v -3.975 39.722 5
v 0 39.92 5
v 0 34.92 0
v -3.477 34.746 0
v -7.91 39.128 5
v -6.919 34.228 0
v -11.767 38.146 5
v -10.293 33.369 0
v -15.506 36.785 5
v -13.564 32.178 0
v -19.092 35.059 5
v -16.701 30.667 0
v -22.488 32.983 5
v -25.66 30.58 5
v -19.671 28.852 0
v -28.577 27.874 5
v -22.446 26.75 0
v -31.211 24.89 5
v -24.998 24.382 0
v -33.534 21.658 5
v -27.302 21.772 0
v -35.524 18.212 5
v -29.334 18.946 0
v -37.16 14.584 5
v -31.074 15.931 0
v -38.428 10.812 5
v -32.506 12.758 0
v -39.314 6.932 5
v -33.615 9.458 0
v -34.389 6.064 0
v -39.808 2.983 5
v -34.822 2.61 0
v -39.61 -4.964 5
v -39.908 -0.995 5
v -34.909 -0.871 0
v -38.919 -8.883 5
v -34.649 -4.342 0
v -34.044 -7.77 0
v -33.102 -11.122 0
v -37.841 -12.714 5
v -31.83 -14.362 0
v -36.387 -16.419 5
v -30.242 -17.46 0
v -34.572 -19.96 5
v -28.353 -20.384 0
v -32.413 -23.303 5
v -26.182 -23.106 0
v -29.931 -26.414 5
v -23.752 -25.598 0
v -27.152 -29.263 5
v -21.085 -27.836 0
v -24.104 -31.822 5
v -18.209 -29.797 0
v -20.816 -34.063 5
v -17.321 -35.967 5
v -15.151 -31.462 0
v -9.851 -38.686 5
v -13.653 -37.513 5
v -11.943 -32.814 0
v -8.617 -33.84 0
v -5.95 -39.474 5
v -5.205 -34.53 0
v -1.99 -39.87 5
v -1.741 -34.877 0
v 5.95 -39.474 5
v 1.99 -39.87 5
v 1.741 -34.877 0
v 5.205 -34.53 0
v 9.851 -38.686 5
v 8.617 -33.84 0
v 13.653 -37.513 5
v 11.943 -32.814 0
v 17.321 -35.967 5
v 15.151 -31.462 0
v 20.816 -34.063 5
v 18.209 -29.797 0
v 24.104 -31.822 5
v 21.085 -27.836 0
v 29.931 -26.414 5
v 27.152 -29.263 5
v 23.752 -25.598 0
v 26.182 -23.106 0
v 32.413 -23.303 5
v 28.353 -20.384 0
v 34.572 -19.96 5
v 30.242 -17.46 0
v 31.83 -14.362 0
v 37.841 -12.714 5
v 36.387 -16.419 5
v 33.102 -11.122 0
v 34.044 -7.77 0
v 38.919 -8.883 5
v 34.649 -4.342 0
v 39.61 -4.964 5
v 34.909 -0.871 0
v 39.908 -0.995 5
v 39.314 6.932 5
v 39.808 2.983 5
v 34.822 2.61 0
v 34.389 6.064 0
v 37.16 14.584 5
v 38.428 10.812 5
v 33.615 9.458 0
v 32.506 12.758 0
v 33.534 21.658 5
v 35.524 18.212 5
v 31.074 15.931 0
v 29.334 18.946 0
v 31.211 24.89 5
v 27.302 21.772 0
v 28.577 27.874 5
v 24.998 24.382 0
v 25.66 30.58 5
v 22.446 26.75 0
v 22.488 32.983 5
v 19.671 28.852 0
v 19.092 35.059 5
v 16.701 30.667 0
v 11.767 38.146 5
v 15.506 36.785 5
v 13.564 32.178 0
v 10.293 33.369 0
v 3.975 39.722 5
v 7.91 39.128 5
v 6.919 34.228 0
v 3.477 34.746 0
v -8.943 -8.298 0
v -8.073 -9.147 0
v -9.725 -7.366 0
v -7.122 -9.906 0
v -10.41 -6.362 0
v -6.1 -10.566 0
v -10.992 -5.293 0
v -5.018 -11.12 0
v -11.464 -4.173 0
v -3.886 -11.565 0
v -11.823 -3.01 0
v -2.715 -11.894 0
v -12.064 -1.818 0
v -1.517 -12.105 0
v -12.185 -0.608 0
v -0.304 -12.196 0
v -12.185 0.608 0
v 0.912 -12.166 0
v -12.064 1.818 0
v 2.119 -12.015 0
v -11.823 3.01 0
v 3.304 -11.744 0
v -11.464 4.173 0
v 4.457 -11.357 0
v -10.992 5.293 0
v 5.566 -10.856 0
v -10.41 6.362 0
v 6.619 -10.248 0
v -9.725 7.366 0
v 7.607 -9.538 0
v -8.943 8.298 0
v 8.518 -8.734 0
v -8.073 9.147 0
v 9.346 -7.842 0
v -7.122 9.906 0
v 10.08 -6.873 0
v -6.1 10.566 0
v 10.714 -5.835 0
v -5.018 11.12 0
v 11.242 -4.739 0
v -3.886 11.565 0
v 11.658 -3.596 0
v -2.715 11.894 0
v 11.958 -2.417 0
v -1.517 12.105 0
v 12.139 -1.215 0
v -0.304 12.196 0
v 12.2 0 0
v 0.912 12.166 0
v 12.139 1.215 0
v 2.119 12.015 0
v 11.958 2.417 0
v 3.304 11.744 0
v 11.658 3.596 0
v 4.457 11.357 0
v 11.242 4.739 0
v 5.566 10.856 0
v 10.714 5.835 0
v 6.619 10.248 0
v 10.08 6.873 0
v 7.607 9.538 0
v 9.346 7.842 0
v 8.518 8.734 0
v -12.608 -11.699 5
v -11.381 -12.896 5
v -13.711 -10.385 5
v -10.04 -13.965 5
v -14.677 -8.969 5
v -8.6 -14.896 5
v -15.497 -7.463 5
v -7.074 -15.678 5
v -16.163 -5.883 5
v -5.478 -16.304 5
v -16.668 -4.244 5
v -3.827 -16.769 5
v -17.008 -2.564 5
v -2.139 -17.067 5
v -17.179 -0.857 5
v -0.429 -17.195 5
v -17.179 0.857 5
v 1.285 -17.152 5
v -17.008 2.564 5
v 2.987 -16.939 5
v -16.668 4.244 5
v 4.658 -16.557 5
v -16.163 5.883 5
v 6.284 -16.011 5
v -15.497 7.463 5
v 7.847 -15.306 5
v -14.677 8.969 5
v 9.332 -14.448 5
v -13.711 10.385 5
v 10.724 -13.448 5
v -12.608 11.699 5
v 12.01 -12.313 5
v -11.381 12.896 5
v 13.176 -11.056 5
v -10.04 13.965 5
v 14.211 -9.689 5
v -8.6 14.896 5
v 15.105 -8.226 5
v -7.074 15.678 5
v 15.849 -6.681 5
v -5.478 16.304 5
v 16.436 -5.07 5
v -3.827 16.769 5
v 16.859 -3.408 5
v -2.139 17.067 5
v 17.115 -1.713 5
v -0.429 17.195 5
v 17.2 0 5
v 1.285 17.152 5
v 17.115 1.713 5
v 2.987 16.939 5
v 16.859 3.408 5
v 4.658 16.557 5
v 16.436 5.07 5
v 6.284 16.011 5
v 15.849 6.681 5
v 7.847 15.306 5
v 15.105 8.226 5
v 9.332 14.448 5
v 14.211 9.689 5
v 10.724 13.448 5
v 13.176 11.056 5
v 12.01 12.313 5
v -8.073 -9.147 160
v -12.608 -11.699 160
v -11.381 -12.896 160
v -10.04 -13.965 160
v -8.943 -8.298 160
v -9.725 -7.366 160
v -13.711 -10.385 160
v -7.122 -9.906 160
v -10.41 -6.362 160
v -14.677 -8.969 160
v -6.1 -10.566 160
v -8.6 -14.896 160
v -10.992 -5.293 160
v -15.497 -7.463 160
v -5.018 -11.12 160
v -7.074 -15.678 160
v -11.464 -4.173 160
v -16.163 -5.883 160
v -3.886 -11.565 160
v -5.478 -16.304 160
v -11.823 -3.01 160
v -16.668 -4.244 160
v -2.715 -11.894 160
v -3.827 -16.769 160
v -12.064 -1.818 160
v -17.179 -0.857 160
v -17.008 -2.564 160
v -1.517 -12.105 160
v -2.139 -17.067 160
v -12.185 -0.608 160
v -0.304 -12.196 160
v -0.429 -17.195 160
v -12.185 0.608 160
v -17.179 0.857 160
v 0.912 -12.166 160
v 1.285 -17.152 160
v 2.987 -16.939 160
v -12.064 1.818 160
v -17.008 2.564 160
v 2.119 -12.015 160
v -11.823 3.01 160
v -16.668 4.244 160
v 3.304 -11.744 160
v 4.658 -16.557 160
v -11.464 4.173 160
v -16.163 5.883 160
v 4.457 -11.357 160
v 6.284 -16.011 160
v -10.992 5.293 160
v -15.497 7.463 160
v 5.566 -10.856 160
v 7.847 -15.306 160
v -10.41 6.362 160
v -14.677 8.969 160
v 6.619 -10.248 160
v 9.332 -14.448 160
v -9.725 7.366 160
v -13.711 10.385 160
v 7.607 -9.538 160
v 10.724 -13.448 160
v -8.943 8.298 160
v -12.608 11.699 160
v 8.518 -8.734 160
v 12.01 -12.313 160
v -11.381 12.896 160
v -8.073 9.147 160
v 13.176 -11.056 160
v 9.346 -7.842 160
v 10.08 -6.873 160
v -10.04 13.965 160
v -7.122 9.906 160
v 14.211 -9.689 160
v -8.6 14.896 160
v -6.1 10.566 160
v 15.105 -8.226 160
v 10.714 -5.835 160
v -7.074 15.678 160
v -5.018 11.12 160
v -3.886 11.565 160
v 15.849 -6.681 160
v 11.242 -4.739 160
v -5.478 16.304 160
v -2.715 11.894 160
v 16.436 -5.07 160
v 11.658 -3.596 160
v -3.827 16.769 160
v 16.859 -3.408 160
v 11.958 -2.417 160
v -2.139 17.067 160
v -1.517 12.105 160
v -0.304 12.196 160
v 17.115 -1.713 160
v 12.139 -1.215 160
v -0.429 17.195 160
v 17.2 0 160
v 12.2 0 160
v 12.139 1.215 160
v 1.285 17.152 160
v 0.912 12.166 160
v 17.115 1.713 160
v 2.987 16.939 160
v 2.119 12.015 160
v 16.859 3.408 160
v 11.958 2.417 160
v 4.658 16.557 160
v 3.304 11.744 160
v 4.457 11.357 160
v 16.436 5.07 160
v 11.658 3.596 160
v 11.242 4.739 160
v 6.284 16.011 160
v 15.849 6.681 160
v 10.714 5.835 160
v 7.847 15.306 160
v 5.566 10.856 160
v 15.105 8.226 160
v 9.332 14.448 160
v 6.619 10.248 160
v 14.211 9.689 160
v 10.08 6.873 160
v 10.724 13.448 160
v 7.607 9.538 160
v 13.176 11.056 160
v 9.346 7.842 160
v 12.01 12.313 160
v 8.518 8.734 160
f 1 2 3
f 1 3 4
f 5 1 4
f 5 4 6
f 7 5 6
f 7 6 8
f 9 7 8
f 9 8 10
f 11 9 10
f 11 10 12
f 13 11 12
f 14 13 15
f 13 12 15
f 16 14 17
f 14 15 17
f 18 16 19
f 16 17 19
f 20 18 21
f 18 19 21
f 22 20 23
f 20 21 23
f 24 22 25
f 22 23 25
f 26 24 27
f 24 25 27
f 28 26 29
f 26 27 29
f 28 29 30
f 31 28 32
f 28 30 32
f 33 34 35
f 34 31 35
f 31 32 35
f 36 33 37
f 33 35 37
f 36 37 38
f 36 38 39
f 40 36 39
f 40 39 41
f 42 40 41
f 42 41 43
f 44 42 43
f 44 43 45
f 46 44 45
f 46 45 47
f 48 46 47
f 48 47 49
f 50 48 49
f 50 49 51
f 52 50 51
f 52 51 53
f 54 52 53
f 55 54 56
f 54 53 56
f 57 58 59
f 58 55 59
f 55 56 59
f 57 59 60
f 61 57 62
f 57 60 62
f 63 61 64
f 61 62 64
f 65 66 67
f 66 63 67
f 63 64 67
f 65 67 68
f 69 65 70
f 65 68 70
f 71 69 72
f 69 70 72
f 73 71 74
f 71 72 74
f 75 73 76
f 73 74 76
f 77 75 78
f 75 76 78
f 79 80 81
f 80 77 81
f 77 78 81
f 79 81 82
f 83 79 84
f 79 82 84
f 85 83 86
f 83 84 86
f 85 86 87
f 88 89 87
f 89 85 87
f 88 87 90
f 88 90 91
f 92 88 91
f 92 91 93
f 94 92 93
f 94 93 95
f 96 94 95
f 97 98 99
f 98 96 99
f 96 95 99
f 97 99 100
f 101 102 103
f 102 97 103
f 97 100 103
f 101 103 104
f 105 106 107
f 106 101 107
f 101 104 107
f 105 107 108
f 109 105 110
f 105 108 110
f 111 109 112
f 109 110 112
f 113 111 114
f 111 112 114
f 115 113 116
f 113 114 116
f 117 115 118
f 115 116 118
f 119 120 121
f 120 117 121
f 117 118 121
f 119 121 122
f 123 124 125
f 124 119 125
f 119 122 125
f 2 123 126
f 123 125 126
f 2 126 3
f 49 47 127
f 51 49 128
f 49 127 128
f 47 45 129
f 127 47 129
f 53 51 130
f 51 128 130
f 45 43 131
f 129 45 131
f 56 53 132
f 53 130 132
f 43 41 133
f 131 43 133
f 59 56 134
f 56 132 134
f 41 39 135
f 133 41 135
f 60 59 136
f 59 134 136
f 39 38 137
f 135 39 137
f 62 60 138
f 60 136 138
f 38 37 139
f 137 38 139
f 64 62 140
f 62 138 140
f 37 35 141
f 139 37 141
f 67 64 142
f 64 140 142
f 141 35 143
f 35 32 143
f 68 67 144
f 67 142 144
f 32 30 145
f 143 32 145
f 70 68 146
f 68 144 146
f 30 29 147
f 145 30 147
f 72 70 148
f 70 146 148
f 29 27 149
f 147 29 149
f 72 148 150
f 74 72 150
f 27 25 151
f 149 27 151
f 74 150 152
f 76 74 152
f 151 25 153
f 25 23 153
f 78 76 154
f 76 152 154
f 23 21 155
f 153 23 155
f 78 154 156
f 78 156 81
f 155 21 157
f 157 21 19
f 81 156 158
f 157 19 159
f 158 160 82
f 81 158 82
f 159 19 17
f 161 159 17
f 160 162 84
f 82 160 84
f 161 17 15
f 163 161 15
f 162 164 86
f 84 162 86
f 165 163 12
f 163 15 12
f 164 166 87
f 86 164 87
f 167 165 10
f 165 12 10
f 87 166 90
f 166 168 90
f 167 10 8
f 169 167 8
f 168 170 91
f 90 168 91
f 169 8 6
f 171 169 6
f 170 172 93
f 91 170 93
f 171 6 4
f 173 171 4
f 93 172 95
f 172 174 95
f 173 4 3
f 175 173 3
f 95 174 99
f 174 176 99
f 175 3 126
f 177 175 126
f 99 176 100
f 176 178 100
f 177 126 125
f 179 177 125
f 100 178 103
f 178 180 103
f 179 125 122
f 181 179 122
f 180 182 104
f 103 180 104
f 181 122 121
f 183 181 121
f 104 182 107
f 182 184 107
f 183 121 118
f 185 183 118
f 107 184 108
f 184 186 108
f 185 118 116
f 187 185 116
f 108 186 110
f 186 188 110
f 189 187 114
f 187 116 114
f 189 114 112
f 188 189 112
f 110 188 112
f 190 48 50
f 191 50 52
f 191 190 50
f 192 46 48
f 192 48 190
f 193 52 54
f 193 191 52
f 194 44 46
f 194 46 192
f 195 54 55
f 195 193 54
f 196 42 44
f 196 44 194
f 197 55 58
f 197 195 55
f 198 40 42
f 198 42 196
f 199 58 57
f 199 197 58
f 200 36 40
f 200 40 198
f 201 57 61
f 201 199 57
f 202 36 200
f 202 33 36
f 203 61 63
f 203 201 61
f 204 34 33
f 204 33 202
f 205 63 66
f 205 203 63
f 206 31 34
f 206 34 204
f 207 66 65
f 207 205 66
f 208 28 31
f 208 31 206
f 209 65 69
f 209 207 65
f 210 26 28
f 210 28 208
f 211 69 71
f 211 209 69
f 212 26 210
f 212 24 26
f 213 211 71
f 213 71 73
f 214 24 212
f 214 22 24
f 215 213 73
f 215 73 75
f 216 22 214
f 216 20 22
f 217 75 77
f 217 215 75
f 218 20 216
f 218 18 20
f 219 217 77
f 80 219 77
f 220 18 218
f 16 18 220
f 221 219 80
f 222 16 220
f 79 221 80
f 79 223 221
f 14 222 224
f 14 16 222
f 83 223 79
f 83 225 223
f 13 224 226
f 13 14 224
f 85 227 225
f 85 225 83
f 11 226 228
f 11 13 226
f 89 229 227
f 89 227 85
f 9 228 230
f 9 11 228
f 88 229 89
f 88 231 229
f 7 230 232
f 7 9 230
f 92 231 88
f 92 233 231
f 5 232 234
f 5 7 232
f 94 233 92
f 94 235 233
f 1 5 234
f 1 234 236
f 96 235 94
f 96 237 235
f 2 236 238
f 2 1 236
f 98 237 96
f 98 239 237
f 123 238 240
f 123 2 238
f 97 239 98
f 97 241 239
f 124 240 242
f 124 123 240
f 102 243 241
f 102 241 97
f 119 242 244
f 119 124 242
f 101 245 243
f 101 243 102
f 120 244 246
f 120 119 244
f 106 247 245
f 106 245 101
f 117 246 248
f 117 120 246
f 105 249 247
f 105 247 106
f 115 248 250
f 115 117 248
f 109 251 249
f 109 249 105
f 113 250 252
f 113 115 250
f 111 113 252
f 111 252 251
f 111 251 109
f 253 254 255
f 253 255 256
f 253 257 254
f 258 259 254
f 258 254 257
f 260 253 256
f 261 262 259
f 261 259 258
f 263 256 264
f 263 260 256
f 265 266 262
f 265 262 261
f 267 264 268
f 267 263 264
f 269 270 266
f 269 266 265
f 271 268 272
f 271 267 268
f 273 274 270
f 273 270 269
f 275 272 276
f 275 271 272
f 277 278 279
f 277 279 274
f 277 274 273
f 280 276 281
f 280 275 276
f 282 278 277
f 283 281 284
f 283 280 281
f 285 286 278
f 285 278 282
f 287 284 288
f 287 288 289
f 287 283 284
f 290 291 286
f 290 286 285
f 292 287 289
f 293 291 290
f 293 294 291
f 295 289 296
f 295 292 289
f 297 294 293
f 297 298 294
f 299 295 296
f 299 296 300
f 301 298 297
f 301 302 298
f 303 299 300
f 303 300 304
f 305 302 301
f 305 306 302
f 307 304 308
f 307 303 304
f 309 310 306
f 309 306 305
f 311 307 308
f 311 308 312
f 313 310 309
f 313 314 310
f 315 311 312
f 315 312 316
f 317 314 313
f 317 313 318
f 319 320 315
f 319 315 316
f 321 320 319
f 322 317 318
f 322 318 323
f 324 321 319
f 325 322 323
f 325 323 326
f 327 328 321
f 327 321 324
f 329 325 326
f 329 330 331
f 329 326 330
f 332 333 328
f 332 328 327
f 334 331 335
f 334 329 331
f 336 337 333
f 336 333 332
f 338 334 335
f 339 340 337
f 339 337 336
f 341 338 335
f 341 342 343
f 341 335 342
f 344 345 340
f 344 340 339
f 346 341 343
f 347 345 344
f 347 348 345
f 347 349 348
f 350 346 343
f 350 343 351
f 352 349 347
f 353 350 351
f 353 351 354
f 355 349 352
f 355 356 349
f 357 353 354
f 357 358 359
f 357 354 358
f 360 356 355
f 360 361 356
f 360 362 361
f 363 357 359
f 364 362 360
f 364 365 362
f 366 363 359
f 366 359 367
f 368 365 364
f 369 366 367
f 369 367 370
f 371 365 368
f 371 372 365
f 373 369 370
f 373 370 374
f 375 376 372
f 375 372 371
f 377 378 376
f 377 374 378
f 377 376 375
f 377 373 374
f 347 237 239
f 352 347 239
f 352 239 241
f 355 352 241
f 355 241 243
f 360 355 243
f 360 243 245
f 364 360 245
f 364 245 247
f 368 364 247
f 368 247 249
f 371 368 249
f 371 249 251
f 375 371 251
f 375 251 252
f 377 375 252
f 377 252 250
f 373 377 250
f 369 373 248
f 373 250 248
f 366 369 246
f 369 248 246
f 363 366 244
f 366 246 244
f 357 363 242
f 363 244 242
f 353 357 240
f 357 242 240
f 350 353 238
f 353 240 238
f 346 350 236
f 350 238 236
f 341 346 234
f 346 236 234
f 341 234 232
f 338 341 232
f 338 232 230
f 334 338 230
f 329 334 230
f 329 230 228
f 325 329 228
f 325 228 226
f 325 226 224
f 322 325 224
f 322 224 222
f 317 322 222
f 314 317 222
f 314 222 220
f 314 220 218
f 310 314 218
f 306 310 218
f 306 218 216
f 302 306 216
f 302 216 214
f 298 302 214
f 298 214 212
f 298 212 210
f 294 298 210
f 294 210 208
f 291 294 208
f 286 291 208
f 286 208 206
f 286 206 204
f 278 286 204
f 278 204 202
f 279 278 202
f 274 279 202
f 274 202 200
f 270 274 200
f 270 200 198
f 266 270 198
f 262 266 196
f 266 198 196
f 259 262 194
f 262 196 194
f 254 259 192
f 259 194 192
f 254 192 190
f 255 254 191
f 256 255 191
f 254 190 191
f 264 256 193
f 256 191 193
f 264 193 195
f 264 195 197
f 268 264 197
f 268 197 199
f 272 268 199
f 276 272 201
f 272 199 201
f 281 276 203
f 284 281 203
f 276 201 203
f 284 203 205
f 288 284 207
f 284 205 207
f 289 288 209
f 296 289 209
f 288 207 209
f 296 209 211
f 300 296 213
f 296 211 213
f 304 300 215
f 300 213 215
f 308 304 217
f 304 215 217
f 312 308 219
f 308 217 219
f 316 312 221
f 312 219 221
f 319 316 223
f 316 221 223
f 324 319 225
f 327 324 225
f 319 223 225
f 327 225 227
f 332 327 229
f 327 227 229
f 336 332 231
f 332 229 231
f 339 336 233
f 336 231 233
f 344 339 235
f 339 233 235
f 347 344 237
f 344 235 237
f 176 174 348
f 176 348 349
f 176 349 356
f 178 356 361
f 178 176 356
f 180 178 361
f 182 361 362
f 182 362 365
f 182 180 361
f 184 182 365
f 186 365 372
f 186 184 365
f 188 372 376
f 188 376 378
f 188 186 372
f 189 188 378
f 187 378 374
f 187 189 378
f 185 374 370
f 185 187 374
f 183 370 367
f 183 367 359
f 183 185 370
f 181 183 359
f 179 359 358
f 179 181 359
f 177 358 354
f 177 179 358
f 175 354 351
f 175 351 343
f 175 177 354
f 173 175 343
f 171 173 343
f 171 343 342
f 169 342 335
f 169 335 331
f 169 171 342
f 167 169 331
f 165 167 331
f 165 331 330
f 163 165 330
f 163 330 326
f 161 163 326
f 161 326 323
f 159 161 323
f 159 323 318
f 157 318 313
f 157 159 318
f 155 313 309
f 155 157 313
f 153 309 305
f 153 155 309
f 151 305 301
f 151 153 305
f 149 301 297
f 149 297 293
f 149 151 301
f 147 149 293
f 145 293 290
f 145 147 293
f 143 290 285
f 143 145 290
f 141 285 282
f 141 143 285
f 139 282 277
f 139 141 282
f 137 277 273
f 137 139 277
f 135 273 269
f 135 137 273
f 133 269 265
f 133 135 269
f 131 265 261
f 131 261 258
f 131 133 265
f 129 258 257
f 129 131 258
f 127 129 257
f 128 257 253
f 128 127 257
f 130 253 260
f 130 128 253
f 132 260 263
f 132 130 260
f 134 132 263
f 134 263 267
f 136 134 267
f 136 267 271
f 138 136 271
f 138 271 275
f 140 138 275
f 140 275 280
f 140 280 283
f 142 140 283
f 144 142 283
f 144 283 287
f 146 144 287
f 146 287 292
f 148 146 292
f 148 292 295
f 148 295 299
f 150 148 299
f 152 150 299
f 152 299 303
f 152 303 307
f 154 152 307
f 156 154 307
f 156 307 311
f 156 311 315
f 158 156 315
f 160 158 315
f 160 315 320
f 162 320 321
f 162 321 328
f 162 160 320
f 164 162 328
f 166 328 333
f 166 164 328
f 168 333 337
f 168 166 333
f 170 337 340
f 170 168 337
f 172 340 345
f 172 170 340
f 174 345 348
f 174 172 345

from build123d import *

# Parameters (mm, degrees)
F3_DEPTH = 5
F1_R     = 17.2
F4_DEPTH = 160
F0_R     = 12.2
F5_DEPTH = 160


# Not quite as in the source:
# - a fillet or chamfer that OpenCascade refuses, or shapes differently, is made with other operations: its cross-section is extruded or revolved along the edge and cut away or added


with BuildPart() as f3:
    # F2 (on Top) → F3 (new body)
    with BuildSketch(Plane.XY):
        with BuildLine():
            ThreePointArc((40, 0), (28.2842712475, 28.2842712475), (0, 40))
            ThreePointArc((0, 40), (-28.2842712475, 28.2842712475), (-40, 0))
            ThreePointArc((-40, 0), (-28.2842712475, -28.2842712475), (0, -40))
            ThreePointArc((0, -40), (28.2842712475, -28.2842712475), (40, 0))
        make_face()
    extrude(amount=F3_DEPTH)

    # F1 (on Top) → F4 (join)
    with BuildSketch(Plane.XY):
        Circle(F1_R)
    extrude(amount=F4_DEPTH)

    # F0 (on Top) → F5 (cut)
    with BuildSketch(Plane.XY):
        Circle(F0_R)
    extrude(amount=F5_DEPTH, mode=Mode.SUBTRACT)

    # F6: chamfer of 5.08 on 1 edges, made by hand

    # F6_s1 → F6_t2 (revolve, cut)
    with BuildSketch(Plane.YZ):
        Polygon((40, 5.08), (34.92, 0), (40, 0), align=None)
    revolve(axis=Axis((0, 0, 0), (0, 0, 1)), mode=Mode.SUBTRACT)


solid = f3.part
